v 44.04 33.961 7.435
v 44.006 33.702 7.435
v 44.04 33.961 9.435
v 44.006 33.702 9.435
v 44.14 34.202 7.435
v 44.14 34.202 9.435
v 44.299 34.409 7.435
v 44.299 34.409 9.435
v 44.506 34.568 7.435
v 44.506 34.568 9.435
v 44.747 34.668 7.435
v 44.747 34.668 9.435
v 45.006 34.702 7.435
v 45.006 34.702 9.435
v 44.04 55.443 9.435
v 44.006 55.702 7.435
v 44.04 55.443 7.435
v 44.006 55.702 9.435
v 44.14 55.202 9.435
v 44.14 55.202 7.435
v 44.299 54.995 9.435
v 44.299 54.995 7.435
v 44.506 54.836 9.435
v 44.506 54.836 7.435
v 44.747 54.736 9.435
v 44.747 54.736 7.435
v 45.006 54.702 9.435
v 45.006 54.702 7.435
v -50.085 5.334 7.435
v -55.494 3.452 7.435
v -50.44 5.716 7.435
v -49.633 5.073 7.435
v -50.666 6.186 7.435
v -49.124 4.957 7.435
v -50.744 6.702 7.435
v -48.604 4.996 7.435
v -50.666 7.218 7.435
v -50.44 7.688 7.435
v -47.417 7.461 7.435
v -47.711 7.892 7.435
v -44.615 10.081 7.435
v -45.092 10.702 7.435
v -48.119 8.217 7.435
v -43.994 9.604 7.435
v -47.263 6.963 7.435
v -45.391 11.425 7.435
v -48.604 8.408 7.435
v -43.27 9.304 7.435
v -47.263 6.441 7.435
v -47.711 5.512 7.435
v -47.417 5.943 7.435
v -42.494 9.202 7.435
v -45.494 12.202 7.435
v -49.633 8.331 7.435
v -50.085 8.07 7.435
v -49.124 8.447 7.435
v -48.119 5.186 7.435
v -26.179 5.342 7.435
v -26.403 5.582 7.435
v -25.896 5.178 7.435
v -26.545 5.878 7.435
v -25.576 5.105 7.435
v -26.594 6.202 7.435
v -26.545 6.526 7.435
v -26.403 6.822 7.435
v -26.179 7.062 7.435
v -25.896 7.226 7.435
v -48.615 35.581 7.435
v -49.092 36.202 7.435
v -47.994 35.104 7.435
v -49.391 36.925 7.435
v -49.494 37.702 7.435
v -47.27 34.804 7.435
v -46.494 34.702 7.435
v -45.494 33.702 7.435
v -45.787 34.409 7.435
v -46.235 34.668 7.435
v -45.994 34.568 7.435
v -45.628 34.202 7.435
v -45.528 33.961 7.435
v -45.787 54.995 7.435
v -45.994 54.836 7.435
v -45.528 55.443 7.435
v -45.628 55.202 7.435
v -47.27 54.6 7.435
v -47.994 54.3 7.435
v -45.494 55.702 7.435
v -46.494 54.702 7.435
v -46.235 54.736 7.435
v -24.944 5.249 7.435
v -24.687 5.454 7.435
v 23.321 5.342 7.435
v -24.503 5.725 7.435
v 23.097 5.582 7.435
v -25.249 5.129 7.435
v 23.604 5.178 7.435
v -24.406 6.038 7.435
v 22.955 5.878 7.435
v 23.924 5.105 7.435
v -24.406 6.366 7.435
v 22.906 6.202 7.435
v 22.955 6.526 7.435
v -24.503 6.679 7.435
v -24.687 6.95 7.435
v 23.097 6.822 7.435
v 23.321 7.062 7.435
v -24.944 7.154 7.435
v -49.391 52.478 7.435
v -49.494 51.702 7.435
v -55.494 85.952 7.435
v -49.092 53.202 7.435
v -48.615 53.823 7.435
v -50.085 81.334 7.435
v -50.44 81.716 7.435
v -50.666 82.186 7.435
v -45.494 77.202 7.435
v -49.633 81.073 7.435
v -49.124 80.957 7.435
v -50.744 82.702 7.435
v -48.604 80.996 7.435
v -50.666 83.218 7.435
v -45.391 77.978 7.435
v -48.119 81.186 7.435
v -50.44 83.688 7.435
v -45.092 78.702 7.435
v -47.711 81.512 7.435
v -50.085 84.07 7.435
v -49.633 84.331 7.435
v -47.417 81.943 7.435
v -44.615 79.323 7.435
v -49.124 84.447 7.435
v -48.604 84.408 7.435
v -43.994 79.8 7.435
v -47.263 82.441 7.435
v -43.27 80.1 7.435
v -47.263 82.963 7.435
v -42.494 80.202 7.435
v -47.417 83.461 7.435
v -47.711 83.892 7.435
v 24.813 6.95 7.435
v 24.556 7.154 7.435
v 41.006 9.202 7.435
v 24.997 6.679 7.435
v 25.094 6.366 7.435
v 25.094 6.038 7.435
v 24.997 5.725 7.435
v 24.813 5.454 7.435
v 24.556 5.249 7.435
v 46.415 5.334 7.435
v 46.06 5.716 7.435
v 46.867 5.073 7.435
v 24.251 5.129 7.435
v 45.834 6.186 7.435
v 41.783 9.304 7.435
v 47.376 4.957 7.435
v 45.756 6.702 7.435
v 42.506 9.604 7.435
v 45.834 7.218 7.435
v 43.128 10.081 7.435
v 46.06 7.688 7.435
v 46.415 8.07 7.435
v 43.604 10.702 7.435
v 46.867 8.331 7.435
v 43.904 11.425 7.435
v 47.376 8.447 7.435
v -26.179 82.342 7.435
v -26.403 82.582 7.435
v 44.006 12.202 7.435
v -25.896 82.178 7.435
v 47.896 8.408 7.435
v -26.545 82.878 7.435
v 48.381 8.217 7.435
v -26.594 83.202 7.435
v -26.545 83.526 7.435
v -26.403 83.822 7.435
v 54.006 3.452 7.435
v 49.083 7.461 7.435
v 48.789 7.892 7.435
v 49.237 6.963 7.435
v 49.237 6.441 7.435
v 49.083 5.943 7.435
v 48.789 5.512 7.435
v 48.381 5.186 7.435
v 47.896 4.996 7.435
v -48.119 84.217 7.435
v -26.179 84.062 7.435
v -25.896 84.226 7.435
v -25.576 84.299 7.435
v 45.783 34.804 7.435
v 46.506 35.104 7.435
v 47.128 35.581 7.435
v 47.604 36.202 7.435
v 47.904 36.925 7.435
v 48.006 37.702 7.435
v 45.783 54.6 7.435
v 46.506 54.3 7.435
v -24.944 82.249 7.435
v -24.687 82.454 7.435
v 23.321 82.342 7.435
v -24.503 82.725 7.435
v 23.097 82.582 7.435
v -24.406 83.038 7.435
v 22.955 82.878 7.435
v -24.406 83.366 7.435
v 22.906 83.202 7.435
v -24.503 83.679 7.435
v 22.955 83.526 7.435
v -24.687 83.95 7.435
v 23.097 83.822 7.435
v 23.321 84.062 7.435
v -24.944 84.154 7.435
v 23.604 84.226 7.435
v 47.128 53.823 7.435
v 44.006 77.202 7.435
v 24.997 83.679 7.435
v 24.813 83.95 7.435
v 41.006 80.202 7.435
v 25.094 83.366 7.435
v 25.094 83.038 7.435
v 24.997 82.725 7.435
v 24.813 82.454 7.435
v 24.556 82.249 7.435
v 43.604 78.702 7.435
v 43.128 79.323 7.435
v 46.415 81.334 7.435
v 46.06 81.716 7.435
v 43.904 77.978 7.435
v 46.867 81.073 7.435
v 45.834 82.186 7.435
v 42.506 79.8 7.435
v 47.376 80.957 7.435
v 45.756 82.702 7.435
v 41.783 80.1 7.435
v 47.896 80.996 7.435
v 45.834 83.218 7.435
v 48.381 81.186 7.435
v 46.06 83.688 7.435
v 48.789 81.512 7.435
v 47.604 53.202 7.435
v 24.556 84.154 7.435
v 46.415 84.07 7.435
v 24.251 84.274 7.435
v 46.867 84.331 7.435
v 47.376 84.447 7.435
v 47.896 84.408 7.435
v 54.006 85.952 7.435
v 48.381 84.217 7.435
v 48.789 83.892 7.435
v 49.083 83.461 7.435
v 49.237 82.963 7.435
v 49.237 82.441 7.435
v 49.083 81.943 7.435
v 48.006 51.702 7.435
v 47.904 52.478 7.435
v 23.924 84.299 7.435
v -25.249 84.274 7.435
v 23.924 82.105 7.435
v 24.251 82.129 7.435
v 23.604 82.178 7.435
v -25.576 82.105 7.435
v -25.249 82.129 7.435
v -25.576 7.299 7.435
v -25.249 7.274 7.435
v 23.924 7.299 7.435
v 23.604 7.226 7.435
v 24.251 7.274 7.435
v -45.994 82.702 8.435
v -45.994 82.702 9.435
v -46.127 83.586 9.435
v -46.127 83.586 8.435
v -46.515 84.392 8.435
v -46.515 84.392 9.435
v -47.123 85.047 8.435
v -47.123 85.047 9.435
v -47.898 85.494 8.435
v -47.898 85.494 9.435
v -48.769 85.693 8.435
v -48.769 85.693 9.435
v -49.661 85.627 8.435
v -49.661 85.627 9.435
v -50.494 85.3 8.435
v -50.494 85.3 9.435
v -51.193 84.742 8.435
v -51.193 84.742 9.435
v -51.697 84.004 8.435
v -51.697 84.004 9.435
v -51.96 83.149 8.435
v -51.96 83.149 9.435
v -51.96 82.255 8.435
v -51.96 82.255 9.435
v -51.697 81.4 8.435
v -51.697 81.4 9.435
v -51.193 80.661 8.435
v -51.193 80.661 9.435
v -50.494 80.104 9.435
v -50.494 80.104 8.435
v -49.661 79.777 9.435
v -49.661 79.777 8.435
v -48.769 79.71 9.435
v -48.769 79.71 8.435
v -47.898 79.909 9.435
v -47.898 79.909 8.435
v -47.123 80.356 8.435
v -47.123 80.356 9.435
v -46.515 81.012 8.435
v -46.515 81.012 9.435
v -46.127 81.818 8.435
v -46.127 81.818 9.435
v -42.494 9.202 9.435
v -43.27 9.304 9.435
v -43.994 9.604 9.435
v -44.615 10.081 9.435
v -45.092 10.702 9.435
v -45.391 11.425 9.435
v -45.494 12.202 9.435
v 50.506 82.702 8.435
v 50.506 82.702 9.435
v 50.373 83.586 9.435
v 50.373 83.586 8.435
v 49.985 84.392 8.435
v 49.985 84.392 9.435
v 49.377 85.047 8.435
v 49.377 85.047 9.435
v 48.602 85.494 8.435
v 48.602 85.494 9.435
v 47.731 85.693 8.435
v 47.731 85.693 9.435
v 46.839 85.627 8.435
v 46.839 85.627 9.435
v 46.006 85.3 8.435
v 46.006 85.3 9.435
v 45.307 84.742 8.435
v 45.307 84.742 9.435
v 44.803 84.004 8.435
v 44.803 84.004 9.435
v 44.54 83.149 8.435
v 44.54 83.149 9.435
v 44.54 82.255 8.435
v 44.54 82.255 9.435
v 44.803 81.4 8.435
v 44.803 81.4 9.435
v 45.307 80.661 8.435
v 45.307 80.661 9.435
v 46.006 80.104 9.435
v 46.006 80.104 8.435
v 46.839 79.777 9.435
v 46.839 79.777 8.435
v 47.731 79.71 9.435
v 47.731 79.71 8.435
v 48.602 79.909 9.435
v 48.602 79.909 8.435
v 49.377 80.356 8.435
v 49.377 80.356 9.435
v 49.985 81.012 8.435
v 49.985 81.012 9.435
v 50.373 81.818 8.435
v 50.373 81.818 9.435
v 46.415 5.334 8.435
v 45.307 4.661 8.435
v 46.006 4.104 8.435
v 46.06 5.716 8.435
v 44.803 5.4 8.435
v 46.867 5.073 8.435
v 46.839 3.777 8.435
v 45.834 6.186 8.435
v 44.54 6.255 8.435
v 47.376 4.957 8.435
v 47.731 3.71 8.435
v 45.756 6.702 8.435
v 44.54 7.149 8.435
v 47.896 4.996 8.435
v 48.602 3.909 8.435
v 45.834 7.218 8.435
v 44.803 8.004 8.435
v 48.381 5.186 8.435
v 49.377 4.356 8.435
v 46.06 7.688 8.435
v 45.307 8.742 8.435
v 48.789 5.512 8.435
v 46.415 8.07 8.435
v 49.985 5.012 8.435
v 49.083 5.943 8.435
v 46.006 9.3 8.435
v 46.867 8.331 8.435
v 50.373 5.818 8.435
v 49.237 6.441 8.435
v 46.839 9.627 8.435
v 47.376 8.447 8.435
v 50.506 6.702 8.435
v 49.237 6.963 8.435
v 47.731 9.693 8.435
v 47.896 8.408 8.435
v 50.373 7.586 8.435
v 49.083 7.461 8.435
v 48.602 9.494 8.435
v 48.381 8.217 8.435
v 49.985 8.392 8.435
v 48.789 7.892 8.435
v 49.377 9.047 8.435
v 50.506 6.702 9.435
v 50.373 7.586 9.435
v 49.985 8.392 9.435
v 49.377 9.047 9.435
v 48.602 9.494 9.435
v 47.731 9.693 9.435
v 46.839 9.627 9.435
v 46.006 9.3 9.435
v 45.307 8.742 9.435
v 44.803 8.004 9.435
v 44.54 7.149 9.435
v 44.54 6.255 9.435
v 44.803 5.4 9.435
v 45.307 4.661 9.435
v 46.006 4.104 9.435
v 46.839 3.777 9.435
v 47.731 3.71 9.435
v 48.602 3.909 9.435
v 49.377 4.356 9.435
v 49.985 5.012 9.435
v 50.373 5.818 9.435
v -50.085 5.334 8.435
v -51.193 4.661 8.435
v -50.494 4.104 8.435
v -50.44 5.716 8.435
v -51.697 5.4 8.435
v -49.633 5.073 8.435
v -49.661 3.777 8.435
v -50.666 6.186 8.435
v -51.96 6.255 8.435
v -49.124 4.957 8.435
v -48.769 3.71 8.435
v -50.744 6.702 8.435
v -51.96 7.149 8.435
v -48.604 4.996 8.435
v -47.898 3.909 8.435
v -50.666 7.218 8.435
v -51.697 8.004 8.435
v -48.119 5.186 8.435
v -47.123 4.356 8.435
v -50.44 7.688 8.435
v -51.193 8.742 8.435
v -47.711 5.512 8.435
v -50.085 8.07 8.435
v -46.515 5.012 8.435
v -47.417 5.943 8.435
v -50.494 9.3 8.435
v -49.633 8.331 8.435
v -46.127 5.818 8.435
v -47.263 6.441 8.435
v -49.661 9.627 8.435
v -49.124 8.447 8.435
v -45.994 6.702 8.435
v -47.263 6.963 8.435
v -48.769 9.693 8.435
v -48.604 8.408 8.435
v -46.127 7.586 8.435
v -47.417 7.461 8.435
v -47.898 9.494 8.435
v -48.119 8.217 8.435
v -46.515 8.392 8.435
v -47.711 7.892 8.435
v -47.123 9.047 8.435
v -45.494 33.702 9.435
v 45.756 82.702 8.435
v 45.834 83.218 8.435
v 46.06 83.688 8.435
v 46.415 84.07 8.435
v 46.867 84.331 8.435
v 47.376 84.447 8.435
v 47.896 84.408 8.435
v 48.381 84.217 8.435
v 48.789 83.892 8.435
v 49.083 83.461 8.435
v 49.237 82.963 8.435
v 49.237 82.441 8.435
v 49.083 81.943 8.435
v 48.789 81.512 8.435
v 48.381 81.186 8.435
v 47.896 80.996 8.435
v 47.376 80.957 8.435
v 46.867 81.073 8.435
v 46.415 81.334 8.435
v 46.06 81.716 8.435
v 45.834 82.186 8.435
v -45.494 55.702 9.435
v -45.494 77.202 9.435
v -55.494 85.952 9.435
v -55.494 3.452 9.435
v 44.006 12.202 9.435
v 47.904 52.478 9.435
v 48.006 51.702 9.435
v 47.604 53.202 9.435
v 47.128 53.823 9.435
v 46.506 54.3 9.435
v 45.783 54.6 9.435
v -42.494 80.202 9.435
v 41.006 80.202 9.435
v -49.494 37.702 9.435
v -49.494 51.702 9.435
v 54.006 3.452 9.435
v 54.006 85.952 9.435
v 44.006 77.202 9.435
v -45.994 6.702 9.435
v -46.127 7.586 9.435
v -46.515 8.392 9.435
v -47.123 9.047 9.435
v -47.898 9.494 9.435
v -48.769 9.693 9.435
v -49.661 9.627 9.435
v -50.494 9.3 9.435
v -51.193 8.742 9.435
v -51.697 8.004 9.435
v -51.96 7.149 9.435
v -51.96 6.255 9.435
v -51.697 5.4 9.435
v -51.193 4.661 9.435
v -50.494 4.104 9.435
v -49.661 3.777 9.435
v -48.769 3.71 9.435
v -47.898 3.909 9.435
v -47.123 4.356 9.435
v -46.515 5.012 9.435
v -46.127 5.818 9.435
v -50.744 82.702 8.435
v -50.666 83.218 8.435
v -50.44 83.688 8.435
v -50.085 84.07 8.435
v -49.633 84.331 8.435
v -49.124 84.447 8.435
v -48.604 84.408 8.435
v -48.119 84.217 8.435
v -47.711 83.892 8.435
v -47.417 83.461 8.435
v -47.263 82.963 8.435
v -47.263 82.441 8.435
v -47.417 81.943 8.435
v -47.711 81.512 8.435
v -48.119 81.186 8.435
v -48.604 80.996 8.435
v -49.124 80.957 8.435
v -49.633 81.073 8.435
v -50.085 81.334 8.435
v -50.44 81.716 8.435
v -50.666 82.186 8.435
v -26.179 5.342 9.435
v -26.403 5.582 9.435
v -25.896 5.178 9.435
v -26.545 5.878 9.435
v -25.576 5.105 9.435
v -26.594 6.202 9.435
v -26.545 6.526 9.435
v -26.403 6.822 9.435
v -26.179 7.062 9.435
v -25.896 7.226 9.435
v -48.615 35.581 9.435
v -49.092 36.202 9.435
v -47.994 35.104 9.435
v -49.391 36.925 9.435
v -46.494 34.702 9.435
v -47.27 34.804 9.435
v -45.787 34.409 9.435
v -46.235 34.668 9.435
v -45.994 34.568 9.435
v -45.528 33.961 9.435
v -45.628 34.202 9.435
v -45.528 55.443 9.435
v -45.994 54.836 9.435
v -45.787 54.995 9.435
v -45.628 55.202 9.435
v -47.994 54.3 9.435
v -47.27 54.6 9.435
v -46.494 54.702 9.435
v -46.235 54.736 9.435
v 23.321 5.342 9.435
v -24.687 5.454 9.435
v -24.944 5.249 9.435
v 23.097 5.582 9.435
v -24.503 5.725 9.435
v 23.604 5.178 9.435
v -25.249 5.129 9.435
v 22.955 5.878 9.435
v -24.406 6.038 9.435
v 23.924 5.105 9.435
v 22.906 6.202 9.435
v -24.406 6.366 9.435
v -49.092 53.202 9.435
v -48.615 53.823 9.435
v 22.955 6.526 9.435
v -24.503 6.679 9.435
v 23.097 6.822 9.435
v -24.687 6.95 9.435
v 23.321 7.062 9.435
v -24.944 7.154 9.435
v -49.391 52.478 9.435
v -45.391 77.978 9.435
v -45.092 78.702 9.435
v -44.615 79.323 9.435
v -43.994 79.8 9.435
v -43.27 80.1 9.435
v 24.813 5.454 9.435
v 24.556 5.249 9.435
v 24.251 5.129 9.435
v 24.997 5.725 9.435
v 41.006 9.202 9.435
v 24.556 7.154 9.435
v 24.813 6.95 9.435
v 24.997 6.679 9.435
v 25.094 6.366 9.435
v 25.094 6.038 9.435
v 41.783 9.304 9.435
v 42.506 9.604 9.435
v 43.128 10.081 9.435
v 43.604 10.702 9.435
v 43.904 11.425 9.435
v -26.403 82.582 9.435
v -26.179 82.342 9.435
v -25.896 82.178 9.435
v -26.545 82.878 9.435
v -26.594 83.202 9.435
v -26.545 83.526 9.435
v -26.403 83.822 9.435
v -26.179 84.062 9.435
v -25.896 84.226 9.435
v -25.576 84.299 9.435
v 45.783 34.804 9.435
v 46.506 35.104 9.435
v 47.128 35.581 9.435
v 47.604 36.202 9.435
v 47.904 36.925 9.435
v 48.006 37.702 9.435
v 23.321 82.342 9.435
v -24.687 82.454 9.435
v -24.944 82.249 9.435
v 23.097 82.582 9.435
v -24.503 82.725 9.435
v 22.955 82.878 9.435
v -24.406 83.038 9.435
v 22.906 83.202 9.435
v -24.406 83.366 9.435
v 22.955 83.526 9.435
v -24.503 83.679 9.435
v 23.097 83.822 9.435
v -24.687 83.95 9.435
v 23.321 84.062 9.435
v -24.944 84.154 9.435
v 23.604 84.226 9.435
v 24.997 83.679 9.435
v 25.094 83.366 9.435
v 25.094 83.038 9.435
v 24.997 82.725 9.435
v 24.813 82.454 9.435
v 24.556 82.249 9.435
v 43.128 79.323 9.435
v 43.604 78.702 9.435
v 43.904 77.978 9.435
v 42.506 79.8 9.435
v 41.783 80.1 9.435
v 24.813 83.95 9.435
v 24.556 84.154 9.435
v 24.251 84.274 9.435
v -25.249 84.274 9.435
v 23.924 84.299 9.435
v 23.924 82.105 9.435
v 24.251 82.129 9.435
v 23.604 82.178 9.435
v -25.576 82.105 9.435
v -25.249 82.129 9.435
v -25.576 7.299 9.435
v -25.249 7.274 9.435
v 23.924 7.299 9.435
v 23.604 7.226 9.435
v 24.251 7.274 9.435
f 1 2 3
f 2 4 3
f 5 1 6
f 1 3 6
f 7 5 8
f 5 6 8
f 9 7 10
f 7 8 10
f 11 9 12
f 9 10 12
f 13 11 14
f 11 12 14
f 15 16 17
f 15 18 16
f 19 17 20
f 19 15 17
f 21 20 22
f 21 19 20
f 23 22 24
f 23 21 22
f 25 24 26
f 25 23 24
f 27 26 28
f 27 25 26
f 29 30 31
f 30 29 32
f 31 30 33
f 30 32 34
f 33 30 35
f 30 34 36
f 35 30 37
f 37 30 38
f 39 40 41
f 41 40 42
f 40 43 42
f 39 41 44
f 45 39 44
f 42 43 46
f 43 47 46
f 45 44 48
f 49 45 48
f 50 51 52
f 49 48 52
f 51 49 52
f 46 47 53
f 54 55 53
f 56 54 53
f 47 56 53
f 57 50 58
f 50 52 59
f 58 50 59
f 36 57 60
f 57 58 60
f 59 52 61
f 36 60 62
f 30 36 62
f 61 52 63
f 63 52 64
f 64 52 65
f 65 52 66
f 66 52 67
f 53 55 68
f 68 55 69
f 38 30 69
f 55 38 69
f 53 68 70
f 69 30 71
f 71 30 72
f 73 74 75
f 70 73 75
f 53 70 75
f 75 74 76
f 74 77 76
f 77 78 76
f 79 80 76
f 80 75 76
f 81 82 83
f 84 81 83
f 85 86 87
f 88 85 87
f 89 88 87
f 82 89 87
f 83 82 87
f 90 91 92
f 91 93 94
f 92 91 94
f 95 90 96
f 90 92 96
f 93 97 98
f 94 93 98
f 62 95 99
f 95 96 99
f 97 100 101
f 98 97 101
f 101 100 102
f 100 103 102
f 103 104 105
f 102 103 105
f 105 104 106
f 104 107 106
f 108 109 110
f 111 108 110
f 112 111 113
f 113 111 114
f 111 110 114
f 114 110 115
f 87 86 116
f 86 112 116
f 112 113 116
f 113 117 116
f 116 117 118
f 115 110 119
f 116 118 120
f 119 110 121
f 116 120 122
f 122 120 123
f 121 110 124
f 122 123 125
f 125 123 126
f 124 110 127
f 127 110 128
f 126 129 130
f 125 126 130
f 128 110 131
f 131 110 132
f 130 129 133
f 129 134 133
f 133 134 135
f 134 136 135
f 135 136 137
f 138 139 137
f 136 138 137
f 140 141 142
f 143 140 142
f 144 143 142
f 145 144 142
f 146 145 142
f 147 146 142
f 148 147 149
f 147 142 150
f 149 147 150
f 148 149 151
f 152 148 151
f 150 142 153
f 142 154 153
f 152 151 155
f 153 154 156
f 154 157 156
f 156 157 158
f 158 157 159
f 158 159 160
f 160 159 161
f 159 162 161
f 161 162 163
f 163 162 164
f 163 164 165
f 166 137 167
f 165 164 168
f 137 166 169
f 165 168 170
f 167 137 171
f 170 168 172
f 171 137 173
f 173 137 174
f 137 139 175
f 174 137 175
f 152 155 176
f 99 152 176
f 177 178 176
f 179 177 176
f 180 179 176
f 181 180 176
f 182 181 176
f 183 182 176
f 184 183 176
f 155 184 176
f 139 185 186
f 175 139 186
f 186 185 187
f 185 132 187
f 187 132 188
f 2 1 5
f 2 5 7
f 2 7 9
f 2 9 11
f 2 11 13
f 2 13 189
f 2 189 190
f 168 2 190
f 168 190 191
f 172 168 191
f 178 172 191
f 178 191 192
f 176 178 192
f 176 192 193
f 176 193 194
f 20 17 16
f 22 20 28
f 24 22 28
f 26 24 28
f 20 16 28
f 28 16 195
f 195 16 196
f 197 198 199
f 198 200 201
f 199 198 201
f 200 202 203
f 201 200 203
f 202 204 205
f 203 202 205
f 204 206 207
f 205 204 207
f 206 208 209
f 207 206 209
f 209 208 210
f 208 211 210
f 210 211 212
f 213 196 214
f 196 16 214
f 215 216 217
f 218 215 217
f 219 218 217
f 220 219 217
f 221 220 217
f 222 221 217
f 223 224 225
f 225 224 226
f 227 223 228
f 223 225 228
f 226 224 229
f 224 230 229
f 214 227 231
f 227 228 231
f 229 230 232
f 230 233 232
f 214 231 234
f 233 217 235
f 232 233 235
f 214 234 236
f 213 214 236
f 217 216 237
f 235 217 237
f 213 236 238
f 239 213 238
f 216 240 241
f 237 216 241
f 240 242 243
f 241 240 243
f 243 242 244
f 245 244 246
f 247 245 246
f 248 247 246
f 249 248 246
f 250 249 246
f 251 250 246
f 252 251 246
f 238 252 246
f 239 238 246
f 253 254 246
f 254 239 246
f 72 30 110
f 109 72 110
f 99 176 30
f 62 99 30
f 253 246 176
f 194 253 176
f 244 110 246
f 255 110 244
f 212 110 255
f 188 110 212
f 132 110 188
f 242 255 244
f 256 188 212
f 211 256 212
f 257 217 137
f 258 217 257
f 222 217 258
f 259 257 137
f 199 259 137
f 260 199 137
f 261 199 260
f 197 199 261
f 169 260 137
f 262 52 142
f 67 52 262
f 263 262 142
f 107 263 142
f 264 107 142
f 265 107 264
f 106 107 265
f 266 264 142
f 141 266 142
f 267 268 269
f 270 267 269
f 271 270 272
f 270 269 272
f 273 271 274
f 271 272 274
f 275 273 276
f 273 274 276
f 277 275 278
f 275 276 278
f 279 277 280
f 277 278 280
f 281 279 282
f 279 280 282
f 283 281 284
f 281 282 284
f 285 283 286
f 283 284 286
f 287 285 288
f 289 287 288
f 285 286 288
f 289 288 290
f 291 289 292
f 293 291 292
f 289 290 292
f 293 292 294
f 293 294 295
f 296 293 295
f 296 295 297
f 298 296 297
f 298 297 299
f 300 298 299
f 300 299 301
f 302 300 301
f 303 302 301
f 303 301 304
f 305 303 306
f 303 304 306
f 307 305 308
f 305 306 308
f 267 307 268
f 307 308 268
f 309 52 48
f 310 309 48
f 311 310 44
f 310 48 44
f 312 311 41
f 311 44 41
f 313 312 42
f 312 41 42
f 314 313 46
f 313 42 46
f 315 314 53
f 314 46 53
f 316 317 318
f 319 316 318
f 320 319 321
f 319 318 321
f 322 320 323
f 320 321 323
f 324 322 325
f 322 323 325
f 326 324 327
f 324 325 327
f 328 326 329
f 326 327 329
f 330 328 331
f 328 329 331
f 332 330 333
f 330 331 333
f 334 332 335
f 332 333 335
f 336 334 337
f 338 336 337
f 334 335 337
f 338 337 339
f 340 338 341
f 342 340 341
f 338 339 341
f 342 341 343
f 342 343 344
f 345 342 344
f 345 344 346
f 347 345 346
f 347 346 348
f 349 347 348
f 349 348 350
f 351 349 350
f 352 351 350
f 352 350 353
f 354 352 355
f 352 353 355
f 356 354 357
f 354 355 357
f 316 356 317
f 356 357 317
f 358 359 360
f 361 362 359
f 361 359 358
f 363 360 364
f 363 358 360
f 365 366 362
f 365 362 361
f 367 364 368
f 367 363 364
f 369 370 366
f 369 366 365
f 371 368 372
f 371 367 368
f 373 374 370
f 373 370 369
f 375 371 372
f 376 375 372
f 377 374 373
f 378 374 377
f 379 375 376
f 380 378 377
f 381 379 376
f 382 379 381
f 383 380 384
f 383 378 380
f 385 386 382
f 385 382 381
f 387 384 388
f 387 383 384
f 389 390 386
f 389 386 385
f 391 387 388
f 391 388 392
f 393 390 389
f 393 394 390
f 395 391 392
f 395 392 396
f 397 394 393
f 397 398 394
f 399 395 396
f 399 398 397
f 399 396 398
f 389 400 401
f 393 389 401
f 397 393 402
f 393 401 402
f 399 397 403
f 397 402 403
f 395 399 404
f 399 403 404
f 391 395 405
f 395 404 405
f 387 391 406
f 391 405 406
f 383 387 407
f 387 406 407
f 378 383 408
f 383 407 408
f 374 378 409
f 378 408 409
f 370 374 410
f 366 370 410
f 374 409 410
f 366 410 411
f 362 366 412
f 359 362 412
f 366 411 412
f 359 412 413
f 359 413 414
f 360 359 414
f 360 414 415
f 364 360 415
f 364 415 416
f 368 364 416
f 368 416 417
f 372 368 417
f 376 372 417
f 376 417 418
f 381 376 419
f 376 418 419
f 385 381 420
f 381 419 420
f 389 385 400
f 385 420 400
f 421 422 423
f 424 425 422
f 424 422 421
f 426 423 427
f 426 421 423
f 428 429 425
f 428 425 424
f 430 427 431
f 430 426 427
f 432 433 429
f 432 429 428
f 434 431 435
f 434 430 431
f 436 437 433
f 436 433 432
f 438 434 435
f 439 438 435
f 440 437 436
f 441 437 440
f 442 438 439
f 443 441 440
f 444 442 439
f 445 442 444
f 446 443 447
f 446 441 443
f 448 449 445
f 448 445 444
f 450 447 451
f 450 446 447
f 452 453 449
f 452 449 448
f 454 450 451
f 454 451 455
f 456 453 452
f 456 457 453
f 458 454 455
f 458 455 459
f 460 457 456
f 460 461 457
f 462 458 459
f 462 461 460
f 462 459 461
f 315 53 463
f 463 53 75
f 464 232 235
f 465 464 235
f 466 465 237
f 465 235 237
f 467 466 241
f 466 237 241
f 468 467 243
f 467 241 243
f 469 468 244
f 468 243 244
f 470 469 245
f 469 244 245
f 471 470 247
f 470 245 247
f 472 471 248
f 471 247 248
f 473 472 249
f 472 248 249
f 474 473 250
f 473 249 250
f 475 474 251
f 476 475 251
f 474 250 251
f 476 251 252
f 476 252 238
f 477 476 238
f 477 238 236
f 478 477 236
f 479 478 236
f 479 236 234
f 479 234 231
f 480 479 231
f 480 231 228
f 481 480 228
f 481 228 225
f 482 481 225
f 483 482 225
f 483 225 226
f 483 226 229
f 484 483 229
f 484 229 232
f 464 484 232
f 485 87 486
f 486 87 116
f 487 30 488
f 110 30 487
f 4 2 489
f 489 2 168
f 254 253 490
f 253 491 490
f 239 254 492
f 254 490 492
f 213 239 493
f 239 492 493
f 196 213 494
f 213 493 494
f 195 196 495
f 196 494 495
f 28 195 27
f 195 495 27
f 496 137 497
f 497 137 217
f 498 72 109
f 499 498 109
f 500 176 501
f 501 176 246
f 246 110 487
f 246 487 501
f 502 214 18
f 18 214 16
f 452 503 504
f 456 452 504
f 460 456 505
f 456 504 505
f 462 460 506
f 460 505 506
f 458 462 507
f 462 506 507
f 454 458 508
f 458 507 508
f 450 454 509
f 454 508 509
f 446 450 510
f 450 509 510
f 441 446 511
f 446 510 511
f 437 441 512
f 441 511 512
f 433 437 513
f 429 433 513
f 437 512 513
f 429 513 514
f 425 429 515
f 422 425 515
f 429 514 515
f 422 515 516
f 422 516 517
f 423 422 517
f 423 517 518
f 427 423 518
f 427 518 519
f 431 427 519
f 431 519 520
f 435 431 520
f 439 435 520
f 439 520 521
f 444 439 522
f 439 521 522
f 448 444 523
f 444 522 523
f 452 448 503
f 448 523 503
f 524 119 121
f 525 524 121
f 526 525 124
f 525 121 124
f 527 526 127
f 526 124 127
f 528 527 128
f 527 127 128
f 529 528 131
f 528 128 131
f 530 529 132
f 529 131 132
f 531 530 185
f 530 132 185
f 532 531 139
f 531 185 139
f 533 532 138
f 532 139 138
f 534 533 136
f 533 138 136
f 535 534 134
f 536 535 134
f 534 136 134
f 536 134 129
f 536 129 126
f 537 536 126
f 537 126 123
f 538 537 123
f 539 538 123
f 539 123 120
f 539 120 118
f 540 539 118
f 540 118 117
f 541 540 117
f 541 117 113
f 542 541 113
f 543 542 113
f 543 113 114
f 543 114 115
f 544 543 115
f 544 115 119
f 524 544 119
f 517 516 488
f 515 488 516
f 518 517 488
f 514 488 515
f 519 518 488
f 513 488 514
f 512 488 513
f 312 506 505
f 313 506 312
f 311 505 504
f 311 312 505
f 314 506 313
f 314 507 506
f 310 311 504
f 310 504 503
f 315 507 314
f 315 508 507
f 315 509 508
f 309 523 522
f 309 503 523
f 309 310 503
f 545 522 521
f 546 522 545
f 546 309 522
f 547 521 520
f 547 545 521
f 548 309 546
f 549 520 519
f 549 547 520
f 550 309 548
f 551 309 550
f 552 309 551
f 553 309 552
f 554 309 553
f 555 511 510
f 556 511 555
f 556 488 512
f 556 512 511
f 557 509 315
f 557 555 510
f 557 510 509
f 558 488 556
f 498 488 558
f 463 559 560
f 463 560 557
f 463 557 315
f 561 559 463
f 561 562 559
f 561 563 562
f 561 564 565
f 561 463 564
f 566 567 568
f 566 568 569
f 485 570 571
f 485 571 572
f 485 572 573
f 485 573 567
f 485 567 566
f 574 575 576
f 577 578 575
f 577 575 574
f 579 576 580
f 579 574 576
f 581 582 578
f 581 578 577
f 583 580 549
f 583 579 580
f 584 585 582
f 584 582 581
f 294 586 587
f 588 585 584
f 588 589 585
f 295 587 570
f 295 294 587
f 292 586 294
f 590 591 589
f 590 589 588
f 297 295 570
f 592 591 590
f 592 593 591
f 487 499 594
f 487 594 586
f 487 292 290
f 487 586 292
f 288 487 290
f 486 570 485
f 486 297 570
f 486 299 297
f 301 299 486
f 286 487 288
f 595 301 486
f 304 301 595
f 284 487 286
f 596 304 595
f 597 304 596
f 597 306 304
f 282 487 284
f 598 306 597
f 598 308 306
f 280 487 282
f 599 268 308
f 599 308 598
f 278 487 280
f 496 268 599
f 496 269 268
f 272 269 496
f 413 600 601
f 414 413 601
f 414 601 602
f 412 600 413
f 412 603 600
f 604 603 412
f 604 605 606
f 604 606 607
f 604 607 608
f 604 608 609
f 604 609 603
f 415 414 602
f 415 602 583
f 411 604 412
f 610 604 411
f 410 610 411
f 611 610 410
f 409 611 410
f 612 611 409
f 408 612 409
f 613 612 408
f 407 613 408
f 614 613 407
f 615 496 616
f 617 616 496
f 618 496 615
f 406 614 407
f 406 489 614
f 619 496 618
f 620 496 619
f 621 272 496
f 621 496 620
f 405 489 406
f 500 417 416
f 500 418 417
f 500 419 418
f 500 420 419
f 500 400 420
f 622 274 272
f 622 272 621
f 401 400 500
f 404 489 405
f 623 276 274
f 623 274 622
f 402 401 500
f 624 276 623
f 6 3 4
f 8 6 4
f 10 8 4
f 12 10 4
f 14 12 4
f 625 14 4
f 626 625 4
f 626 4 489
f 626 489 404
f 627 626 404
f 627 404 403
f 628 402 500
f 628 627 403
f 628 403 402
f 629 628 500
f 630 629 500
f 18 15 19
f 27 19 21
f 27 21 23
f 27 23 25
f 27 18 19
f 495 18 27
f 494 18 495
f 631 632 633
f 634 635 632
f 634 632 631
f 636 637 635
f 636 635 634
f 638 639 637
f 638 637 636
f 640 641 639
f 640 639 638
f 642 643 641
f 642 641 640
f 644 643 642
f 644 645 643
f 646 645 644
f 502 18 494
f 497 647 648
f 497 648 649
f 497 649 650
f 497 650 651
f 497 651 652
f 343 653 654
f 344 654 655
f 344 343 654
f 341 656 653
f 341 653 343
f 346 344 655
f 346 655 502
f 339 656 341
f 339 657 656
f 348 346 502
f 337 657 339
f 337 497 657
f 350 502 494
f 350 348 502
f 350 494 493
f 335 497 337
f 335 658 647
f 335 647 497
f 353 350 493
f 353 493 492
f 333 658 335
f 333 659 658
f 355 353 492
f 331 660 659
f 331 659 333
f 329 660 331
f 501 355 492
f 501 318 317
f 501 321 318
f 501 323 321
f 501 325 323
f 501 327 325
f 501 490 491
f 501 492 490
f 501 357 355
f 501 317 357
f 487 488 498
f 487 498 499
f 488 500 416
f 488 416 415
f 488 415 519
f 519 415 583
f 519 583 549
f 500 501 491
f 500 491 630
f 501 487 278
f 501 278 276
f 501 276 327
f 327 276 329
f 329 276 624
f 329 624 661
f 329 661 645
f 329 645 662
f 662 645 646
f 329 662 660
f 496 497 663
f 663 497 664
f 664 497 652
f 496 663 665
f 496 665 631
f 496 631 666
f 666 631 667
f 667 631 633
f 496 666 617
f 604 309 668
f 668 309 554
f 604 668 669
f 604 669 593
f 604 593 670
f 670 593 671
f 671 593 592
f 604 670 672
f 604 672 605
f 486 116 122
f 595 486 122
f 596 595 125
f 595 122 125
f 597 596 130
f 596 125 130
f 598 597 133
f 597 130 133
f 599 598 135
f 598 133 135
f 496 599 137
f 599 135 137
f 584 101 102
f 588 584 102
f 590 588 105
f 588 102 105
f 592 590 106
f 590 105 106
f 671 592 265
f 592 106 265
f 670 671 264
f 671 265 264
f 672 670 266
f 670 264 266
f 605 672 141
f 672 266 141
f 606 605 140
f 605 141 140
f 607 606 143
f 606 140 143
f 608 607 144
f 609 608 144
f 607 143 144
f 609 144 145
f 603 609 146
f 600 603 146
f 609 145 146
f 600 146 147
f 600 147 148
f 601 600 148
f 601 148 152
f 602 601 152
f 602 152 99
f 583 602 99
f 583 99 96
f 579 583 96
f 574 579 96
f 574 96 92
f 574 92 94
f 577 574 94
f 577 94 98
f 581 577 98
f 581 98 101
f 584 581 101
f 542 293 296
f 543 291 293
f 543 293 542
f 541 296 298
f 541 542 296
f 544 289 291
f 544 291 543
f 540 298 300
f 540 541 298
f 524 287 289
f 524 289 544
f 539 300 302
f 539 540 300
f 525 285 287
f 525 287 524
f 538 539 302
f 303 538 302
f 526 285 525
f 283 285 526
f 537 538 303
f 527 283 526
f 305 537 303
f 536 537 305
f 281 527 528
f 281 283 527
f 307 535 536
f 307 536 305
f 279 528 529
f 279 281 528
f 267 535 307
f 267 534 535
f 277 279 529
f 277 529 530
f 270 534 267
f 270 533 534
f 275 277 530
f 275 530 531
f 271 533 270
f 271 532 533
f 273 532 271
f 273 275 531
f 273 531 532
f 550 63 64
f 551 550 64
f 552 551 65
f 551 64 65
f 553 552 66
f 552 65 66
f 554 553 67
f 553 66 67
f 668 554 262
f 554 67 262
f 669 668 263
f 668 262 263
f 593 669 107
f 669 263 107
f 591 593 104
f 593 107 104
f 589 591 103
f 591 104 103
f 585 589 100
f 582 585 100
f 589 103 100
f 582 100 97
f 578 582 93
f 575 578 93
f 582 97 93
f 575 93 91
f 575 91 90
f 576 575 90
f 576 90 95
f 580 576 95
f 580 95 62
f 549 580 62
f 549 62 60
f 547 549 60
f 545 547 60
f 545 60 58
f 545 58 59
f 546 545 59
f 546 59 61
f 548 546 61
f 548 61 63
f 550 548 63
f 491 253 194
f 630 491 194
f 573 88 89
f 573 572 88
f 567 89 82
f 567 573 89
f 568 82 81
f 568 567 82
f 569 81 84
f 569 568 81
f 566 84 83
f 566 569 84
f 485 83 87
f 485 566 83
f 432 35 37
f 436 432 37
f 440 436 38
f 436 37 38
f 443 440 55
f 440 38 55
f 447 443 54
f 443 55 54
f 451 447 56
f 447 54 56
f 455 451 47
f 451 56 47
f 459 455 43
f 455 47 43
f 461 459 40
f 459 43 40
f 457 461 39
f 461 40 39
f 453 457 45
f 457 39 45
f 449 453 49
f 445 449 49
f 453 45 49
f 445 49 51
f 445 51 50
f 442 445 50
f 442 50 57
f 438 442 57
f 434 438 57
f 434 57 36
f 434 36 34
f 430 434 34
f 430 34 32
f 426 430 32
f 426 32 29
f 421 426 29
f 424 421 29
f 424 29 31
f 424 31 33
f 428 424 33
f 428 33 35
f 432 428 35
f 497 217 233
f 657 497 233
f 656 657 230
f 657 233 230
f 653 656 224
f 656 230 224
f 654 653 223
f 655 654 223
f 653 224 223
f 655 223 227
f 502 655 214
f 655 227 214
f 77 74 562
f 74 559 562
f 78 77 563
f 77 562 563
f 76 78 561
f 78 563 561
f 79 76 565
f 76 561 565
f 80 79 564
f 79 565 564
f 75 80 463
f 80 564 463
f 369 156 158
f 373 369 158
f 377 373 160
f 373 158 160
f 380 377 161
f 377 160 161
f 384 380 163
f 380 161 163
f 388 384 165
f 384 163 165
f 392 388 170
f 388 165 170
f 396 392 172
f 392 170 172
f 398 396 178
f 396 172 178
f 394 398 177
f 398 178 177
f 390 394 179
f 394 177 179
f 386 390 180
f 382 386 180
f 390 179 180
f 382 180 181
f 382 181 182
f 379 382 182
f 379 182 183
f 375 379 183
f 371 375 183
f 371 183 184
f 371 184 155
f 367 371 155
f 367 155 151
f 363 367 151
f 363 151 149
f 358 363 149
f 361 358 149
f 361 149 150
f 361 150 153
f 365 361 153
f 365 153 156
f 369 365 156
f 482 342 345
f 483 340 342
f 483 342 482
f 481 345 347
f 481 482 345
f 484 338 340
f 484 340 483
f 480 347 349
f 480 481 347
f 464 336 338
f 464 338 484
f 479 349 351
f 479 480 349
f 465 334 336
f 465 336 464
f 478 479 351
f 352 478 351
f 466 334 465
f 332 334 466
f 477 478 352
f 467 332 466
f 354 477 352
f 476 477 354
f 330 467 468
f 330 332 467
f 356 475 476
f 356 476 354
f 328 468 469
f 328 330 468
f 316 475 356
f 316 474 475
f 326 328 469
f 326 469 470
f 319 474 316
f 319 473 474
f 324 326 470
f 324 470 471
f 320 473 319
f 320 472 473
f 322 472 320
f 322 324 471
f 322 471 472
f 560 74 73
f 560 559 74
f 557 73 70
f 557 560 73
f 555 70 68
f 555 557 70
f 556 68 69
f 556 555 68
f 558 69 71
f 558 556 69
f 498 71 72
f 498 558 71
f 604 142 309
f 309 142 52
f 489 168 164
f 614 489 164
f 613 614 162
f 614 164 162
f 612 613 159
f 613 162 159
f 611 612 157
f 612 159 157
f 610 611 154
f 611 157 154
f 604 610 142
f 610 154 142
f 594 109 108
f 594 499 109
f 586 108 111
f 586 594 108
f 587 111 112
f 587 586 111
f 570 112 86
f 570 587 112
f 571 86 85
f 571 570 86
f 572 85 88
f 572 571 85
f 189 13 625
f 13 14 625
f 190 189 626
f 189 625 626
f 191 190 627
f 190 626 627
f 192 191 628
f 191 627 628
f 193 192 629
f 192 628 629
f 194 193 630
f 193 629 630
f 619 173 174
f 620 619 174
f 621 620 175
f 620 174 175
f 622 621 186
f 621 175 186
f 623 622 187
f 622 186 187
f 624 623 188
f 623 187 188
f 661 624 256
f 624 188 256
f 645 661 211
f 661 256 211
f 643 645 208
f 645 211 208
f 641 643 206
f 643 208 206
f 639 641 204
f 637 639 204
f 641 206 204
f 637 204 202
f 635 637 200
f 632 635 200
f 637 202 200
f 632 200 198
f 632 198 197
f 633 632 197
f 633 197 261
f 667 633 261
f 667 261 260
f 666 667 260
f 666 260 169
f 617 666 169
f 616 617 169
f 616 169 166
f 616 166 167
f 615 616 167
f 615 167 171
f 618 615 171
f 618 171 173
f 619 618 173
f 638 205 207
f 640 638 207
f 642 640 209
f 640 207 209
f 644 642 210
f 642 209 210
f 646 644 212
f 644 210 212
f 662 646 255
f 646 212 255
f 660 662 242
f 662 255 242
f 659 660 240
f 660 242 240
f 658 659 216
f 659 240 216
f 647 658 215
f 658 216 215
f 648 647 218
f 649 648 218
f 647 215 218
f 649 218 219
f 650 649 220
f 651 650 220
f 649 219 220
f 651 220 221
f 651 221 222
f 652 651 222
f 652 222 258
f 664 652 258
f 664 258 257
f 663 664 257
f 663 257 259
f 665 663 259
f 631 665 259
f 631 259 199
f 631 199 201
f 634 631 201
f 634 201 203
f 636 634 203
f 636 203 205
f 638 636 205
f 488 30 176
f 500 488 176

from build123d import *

# Parameters (mm, degrees)
SKETCH1_W                  = 109.5
SKETCH1_H                  = 82.5
BOSS_EXTRUDE1_DEPTH        = 2
F_3_5_3_5_DIAMETER_HOLE1_D = 3.5
F_2_2_2_2_DIAMETER_HOLE1_D = 2.2
SKETCH12_R                 = 3
CUT_EXTRUDE1_DEPTH         = 1
FILLET1_R                  = 3
FILLET2_R                  = 1


with BuildPart() as part:
    # Sketch1 → Boss-Extrude1 (new body)
    with BuildSketch(Plane.XY.offset(7.43465612)):
        with Locations((-0.743641502, 44.70185693)):
            Rectangle(SKETCH1_W, SKETCH1_H)
        with BuildLine():
            Line((-45.493641502, 34.70185693), (-49.493641502, 34.70185693))
            Line((-49.493641502, 34.70185693), (-49.493641502, 54.70185693))
            Line((-49.493641502, 54.70185693), (-45.493641502, 54.70185693))
            Line((-45.493641502, 54.70185693), (-45.493641502, 77.20185693))
            ThreePointArc((-45.493641502, 77.20185693), (-44.614961845, 79.323177274), (-42.493641502, 80.20185693))
            Line((-42.493641502, 80.20185693), (41.006358498, 80.20185693))
            ThreePointArc((41.006358498, 80.20185693), (43.127678842, 79.323177274), (44.006358498, 77.20185693))
            Line((44.006358498, 77.20185693), (44.006358498, 54.70185693))
            Line((44.006358498, 54.70185693), (48.006358498, 54.70185693))
            Line((48.006358498, 54.70185693), (48.006358498, 44.70185693))
            Line((48.006358498, 44.70185693), (48.006358498, 34.70185693))
            Line((48.006358498, 34.70185693), (44.006358498, 34.70185693))
            Line((44.006358498, 34.70185693), (44.006358498, 12.20185693))
            ThreePointArc((44.006358498, 12.20185693), (43.127678842, 10.080536587), (41.006358498, 9.20185693))
            Line((41.006358498, 9.20185693), (-42.493641502, 9.20185693))
            ThreePointArc((-42.493641502, 9.20185693), (-44.614961845, 10.080536587), (-45.493641502, 12.20185693))
            Line((-45.493641502, 12.20185693), (-45.493641502, 34.70185693))
        make_face(mode=Mode.SUBTRACT)
    extrude(amount=BOSS_EXTRUDE1_DEPTH)

    # Ø3.5 (3.5) Diameter Hole1 (through all)
    with Locations(Plane.XY.offset(9.43465612)):
        with Locations((-48.993641502, 6.70185693), (-48.993641502, 82.70185693), (47.506358498, 82.70185693), (47.506358498, 6.70185693)):
            Hole(F_3_5_3_5_DIAMETER_HOLE1_D / 2)

    # Ø2.2 (2.2) Diameter Hole1 (through all)
    with Locations(Plane(origin=(-25.493641502, 83.20185693, 9.43465612), x_dir=(1, 0, 0), z_dir=(0, 0, 1))):
        with Locations((0, 0), (49.5, 0), (49.5, -77), (0, -77)):
            Hole(F_2_2_2_2_DIAMETER_HOLE1_D / 2)

    # Sketch12 → Cut-Extrude1 (cut)
    with BuildSketch(Plane.XY.offset(9.43465612)):
        with Locations((-48.993641502, 82.70185693)):
            Circle(SKETCH12_R)
        with Locations((47.506358498, 82.70185693)):
            Circle(SKETCH12_R)
        with Locations((47.506358498, 6.70185693)):
            Circle(SKETCH12_R)
        with Locations((-48.993641502, 6.70185693)):
            Circle(SKETCH12_R)
    extrude(amount=-CUT_EXTRUDE1_DEPTH, mode=Mode.SUBTRACT)

    # Fillet1
    fillet1_edges = [part.edges().sort_by_distance(p)[0] for p in [
        (48.006358498, 34.70185693, 8.43465612),
        (48.006358498, 54.70185693, 8.43465612),
        (-49.493641502, 54.70185693, 8.43465612),
        (-49.493641502, 34.70185693, 8.43465612),
    ]]
    fillet(fillet1_edges, radius=FILLET1_R)

    # Fillet2
    fillet2_edges = [part.edges().sort_by_distance(p)[0] for p in [
        (44.006358498, 34.70185693, 8.43465612),
        (44.006358498, 54.70185693, 8.43465612),
        (-45.493641502, 34.70185693, 8.43465612),
        (-45.493641502, 54.70185693, 8.43465612),
    ]]
    fillet(fillet2_edges, radius=FILLET2_R - 0.0001)  # a hair under: the kernel refuses the full size


solid = part.part
